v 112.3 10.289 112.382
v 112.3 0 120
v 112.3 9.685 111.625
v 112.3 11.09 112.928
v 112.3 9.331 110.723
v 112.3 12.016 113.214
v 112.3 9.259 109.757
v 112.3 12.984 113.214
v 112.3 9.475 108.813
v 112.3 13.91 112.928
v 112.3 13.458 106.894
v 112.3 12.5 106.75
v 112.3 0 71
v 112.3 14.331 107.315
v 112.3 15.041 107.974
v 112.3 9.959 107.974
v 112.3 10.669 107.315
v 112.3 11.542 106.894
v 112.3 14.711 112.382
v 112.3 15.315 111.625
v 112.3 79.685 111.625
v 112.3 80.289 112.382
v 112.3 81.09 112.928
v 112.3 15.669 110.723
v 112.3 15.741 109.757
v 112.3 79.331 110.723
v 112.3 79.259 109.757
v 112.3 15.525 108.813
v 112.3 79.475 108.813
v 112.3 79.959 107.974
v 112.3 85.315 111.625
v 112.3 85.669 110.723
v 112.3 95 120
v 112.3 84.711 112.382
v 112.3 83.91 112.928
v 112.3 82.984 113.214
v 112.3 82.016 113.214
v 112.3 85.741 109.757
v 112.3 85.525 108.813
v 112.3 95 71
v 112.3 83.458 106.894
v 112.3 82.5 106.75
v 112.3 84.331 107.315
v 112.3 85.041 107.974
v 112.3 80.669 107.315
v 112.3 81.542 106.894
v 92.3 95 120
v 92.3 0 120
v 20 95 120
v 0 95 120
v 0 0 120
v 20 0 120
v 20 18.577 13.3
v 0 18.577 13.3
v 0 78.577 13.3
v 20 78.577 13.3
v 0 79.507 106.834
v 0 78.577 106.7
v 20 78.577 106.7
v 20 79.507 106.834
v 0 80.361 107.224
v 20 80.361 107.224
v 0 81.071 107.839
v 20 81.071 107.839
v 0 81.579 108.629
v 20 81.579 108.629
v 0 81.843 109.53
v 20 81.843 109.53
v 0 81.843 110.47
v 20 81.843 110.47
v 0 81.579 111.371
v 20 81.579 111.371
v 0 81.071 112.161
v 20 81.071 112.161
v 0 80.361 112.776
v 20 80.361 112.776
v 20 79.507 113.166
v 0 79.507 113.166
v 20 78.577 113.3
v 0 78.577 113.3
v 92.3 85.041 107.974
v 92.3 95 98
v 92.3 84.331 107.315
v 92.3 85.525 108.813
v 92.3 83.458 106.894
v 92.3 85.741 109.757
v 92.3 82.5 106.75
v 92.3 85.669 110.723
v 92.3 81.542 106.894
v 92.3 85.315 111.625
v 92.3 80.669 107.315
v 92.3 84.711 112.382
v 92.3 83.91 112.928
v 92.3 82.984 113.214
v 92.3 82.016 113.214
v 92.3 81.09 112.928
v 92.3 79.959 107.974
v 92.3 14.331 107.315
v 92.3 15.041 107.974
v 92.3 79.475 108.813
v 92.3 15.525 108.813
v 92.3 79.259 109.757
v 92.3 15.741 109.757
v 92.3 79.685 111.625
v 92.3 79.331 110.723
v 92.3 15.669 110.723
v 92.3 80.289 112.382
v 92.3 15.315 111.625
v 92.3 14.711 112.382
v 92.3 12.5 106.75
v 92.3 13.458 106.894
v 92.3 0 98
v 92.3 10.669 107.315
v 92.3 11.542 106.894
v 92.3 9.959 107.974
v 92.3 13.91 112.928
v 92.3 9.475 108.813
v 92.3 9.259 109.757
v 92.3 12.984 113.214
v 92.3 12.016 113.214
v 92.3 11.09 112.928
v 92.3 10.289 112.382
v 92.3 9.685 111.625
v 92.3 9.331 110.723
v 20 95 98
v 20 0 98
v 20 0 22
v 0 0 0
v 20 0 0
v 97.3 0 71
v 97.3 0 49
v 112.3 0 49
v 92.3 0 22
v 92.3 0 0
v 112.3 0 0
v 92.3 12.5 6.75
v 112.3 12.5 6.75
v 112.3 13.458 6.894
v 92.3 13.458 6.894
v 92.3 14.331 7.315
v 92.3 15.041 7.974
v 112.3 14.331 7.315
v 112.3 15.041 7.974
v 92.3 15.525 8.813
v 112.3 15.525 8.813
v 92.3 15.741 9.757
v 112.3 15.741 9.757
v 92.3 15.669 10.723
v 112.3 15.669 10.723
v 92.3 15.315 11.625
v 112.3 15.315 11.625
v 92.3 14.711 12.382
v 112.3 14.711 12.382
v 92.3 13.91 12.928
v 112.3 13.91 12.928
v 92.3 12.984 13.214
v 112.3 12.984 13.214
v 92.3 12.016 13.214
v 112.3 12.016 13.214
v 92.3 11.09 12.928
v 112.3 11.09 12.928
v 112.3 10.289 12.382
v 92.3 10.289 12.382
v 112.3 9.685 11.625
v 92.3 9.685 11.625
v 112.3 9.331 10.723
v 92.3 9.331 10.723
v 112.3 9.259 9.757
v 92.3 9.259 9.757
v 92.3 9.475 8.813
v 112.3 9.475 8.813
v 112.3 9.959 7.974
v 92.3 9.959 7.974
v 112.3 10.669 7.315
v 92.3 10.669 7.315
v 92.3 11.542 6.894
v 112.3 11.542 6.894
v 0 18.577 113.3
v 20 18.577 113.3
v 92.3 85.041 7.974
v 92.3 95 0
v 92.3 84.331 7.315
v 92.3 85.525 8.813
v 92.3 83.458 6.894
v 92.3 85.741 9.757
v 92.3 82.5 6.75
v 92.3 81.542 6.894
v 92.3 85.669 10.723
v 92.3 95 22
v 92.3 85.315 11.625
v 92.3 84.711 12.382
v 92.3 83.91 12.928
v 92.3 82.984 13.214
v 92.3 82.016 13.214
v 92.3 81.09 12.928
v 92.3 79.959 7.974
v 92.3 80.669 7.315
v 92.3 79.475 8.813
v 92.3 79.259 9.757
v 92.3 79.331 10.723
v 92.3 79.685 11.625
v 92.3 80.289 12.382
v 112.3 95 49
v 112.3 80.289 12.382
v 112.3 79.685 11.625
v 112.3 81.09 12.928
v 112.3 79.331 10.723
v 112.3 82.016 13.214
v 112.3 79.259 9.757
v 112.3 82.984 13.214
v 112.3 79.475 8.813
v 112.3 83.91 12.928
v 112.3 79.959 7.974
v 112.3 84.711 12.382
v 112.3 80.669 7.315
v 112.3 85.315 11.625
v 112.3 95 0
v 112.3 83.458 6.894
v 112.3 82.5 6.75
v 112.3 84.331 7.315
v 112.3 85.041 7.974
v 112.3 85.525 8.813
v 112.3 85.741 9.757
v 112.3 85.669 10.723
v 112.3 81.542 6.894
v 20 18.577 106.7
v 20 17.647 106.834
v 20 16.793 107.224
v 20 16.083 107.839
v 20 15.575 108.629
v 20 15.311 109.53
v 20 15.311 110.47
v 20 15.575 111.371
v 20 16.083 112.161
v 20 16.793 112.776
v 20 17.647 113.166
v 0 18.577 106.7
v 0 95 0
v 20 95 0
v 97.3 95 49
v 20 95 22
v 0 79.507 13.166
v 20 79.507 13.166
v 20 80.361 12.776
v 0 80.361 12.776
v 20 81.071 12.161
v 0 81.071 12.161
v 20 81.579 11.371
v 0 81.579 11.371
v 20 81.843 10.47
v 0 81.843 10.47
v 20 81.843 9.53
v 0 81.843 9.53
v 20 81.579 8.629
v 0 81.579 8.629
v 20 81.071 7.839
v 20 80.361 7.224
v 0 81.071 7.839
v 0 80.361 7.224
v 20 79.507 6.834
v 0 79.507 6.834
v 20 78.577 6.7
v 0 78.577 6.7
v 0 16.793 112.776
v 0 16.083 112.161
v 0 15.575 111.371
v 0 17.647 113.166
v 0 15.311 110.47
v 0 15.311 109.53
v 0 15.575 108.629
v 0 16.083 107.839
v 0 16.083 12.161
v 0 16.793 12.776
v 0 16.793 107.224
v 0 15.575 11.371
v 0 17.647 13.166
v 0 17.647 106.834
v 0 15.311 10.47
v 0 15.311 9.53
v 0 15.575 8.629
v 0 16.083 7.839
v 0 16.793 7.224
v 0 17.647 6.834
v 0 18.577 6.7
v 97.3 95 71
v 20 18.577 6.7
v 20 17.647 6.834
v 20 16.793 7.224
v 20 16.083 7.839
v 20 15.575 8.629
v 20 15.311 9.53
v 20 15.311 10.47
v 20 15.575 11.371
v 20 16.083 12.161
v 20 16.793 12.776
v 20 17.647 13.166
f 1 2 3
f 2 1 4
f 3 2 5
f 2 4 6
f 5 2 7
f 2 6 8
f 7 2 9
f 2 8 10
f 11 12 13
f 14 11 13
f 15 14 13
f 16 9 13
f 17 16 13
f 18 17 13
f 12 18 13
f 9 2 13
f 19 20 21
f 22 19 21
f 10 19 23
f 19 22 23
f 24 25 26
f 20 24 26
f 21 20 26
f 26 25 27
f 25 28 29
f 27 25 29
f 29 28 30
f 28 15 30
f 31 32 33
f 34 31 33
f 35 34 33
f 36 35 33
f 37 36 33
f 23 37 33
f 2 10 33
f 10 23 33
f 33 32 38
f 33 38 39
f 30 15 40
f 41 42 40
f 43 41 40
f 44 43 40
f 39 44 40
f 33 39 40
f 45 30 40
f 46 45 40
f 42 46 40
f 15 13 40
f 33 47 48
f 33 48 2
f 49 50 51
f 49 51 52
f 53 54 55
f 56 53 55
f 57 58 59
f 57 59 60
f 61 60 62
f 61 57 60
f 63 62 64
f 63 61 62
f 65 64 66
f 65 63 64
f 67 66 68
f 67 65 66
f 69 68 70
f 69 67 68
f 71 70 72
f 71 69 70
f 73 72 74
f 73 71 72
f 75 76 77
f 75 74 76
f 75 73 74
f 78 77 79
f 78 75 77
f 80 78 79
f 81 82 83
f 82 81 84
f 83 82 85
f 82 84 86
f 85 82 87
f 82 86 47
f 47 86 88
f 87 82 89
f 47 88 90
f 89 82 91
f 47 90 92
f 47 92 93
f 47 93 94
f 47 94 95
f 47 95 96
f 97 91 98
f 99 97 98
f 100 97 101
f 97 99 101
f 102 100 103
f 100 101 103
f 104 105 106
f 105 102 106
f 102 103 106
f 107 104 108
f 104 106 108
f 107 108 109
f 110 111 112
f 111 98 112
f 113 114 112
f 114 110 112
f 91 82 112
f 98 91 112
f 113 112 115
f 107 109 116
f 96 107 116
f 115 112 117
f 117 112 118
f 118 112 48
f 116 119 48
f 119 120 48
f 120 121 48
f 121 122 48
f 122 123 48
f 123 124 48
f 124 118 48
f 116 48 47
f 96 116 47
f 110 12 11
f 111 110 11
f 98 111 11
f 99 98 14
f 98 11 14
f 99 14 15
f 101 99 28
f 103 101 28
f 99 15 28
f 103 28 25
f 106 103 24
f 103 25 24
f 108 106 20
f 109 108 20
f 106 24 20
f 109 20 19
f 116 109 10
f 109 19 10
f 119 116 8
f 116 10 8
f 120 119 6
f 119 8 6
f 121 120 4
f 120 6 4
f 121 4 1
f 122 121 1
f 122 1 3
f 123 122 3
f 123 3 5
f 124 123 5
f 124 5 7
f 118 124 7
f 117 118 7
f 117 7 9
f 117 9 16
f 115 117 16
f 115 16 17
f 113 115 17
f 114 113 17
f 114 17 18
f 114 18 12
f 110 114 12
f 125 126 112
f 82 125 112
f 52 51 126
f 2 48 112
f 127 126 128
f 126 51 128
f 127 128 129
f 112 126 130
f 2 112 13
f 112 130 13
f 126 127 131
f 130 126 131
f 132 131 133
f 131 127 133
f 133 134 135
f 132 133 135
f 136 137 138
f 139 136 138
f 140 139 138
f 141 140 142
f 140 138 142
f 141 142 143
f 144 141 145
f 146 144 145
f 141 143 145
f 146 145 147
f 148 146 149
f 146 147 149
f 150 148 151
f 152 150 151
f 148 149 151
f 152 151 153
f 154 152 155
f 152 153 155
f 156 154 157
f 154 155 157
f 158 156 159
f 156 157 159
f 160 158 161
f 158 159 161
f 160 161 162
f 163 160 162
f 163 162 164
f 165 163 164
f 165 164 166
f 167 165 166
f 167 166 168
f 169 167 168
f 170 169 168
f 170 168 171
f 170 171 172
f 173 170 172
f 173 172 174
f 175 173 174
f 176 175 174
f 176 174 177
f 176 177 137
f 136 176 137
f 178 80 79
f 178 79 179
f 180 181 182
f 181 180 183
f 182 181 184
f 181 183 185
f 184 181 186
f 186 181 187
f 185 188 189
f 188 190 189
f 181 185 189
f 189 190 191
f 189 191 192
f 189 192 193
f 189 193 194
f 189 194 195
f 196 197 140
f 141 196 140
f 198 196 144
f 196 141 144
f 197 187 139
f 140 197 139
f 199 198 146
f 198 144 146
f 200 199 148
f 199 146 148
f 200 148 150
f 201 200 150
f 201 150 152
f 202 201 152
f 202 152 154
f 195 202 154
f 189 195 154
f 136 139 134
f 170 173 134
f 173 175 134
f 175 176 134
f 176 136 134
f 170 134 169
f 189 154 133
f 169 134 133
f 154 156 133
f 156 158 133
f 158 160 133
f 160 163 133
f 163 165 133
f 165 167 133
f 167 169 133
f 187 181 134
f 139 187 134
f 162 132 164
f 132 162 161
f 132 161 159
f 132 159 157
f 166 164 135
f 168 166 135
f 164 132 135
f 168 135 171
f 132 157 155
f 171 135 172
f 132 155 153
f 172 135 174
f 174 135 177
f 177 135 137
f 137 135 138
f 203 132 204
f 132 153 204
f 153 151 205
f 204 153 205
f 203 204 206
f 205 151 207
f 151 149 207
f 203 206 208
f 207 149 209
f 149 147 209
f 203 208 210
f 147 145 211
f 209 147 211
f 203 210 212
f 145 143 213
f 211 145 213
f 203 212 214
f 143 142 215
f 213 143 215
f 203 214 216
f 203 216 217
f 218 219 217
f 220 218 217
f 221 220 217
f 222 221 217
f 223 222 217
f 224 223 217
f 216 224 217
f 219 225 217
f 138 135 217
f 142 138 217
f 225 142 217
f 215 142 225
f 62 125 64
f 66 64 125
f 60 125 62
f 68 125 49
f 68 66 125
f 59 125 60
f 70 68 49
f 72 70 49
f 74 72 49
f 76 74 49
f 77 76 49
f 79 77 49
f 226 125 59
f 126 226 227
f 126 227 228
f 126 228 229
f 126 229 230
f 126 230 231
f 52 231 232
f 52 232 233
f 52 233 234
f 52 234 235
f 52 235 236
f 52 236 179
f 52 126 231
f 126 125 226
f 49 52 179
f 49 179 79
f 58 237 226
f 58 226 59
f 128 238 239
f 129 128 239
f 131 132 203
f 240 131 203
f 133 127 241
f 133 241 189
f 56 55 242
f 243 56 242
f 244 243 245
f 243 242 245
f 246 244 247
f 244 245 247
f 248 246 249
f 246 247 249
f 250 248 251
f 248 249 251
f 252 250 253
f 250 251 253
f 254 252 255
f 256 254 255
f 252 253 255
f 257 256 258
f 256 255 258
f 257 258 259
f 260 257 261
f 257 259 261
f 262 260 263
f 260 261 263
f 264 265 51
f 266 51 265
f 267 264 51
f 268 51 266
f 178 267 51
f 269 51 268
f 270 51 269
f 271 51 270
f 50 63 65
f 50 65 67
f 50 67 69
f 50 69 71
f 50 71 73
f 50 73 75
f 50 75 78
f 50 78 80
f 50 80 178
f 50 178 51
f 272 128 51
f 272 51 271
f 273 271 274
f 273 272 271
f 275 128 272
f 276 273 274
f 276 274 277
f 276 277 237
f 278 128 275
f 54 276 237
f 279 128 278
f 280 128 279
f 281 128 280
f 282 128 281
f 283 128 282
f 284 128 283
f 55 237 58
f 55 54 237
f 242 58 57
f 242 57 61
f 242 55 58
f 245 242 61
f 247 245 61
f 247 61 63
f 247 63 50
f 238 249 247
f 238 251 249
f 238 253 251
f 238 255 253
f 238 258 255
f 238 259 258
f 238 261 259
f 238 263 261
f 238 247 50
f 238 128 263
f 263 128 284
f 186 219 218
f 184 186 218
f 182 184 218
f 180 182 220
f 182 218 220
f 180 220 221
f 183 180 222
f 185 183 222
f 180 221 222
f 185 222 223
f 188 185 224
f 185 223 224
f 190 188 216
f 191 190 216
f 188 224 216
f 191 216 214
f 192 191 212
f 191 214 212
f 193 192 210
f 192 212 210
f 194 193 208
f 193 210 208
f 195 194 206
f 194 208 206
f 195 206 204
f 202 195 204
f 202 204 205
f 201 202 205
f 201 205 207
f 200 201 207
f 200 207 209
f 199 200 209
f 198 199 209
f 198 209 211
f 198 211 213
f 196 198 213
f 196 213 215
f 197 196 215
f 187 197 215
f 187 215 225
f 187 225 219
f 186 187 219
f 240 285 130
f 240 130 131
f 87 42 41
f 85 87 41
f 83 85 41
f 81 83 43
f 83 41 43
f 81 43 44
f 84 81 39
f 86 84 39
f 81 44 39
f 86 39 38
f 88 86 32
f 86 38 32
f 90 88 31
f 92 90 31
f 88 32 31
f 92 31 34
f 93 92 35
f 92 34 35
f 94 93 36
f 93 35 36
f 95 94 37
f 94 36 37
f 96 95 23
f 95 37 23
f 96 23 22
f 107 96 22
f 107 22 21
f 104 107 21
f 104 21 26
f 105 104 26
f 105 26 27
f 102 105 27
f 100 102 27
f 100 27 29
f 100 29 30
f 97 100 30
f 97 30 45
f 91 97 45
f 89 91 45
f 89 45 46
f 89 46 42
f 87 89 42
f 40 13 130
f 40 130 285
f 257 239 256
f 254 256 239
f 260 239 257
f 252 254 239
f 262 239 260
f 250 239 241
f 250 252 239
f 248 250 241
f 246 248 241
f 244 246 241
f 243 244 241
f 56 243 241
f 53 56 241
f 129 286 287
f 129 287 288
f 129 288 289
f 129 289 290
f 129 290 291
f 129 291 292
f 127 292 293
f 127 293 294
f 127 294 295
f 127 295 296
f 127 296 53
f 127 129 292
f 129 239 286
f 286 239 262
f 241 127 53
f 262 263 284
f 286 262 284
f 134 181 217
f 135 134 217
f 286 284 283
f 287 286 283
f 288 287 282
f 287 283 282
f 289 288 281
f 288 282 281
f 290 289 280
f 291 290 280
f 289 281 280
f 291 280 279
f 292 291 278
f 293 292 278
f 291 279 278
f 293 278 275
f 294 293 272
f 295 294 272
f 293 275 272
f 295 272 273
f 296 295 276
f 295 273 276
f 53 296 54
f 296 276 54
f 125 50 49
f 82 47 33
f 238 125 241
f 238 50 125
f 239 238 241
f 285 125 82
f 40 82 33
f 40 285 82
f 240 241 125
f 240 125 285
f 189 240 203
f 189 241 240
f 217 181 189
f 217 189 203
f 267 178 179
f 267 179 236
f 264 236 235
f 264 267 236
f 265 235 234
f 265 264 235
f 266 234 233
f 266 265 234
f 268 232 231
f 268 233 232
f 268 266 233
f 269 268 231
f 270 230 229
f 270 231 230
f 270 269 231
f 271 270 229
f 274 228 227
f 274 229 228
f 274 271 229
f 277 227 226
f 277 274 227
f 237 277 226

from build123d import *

# Parameters (mm, degrees)
SKETCH_1_W          = 112.3
SKETCH_1_H          = 95
EXTRUDE_1_DEPTH     = 120
SKETCH_2_W          = 72.3
SKETCH_2_H          = 22
CUT_EXTRUDE_1_DEPTH = 190.832268068
CUT_EXTRUDE_2_DEPTH = 25
SKETCH_4_R          = 3.25
CUT_EXTRUDE_3_DEPTH = 25
SKETCH_6_W          = 22
SKETCH_6_H          = 95
CUT_EXTRUDE_4_DEPTH = 15


with BuildPart() as part:
    # 草图1 → 凸台-拉伸1 (new body)
    with BuildSketch(Plane.XY):
        with Locations((56.15, 47.5)):
            Rectangle(SKETCH_1_W, SKETCH_1_H)
    extrude(amount=EXTRUDE_1_DEPTH)

    # 草图2 → 切除-拉伸1 (cut, through all)
    with BuildSketch(Plane.XZ):
        with Locations((56.15, 109)):
            Rectangle(SKETCH_2_W, SKETCH_2_H)
        with Locations((56.15, 11)):
            Rectangle(SKETCH_2_W, SKETCH_2_H)
    extrude(amount=-CUT_EXTRUDE_1_DEPTH, mode=Mode.SUBTRACT)

    # 草图3 → 切除-拉伸2 (cut)
    with BuildSketch(Plane.ZY):
        with BuildLine():
            Line((106.7, 18.576960217), (106.7, 78.576960217))
            ThreePointArc((106.7, 78.576960217), (110, 81.876960217), (113.3, 78.576960217))
            Line((113.3, 78.576960217), (113.3, 18.576960217))
            ThreePointArc((113.3, 18.576960217), (110, 15.276960217), (106.7, 18.576960217))
        make_face()
        with BuildLine():
            Line((13.3, 18.576960217), (13.3, 78.576960217))
            ThreePointArc((13.3, 78.576960217), (10, 81.876960217), (6.7, 78.576960217))
            Line((6.7, 78.576960217), (6.7, 18.576960217))
            ThreePointArc((6.7, 18.576960217), (10, 15.276960217), (13.3, 18.576960217))
        make_face()
    extrude(amount=-CUT_EXTRUDE_2_DEPTH, mode=Mode.SUBTRACT)

    # 草图4 → 切除-拉伸3 (cut)
    with BuildSketch(Plane(origin=(112.3, 0, 0), x_dir=(0, 0, -1), z_dir=(1, 0, 0))):
        with Locations((-110, 82.5)):
            Circle(SKETCH_4_R)
        with Locations((-10, 82.5)):
            Circle(SKETCH_4_R)
        with Locations((-10, 12.5)):
            Circle(SKETCH_4_R)
        with Locations((-110, 12.5)):
            Circle(SKETCH_4_R)
    extrude(amount=-CUT_EXTRUDE_3_DEPTH, mode=Mode.SUBTRACT)

    # 草图6 → 切除-拉伸4 (cut)
    with BuildSketch(Plane(origin=(112.3, 0, 0), x_dir=(0, 0, -1), z_dir=(1, 0, 0))):
        with Locations((-60, 47.5)):
            Rectangle(SKETCH_6_W, SKETCH_6_H)
    extrude(amount=-CUT_EXTRUDE_4_DEPTH, mode=Mode.SUBTRACT)


solid = part.part
